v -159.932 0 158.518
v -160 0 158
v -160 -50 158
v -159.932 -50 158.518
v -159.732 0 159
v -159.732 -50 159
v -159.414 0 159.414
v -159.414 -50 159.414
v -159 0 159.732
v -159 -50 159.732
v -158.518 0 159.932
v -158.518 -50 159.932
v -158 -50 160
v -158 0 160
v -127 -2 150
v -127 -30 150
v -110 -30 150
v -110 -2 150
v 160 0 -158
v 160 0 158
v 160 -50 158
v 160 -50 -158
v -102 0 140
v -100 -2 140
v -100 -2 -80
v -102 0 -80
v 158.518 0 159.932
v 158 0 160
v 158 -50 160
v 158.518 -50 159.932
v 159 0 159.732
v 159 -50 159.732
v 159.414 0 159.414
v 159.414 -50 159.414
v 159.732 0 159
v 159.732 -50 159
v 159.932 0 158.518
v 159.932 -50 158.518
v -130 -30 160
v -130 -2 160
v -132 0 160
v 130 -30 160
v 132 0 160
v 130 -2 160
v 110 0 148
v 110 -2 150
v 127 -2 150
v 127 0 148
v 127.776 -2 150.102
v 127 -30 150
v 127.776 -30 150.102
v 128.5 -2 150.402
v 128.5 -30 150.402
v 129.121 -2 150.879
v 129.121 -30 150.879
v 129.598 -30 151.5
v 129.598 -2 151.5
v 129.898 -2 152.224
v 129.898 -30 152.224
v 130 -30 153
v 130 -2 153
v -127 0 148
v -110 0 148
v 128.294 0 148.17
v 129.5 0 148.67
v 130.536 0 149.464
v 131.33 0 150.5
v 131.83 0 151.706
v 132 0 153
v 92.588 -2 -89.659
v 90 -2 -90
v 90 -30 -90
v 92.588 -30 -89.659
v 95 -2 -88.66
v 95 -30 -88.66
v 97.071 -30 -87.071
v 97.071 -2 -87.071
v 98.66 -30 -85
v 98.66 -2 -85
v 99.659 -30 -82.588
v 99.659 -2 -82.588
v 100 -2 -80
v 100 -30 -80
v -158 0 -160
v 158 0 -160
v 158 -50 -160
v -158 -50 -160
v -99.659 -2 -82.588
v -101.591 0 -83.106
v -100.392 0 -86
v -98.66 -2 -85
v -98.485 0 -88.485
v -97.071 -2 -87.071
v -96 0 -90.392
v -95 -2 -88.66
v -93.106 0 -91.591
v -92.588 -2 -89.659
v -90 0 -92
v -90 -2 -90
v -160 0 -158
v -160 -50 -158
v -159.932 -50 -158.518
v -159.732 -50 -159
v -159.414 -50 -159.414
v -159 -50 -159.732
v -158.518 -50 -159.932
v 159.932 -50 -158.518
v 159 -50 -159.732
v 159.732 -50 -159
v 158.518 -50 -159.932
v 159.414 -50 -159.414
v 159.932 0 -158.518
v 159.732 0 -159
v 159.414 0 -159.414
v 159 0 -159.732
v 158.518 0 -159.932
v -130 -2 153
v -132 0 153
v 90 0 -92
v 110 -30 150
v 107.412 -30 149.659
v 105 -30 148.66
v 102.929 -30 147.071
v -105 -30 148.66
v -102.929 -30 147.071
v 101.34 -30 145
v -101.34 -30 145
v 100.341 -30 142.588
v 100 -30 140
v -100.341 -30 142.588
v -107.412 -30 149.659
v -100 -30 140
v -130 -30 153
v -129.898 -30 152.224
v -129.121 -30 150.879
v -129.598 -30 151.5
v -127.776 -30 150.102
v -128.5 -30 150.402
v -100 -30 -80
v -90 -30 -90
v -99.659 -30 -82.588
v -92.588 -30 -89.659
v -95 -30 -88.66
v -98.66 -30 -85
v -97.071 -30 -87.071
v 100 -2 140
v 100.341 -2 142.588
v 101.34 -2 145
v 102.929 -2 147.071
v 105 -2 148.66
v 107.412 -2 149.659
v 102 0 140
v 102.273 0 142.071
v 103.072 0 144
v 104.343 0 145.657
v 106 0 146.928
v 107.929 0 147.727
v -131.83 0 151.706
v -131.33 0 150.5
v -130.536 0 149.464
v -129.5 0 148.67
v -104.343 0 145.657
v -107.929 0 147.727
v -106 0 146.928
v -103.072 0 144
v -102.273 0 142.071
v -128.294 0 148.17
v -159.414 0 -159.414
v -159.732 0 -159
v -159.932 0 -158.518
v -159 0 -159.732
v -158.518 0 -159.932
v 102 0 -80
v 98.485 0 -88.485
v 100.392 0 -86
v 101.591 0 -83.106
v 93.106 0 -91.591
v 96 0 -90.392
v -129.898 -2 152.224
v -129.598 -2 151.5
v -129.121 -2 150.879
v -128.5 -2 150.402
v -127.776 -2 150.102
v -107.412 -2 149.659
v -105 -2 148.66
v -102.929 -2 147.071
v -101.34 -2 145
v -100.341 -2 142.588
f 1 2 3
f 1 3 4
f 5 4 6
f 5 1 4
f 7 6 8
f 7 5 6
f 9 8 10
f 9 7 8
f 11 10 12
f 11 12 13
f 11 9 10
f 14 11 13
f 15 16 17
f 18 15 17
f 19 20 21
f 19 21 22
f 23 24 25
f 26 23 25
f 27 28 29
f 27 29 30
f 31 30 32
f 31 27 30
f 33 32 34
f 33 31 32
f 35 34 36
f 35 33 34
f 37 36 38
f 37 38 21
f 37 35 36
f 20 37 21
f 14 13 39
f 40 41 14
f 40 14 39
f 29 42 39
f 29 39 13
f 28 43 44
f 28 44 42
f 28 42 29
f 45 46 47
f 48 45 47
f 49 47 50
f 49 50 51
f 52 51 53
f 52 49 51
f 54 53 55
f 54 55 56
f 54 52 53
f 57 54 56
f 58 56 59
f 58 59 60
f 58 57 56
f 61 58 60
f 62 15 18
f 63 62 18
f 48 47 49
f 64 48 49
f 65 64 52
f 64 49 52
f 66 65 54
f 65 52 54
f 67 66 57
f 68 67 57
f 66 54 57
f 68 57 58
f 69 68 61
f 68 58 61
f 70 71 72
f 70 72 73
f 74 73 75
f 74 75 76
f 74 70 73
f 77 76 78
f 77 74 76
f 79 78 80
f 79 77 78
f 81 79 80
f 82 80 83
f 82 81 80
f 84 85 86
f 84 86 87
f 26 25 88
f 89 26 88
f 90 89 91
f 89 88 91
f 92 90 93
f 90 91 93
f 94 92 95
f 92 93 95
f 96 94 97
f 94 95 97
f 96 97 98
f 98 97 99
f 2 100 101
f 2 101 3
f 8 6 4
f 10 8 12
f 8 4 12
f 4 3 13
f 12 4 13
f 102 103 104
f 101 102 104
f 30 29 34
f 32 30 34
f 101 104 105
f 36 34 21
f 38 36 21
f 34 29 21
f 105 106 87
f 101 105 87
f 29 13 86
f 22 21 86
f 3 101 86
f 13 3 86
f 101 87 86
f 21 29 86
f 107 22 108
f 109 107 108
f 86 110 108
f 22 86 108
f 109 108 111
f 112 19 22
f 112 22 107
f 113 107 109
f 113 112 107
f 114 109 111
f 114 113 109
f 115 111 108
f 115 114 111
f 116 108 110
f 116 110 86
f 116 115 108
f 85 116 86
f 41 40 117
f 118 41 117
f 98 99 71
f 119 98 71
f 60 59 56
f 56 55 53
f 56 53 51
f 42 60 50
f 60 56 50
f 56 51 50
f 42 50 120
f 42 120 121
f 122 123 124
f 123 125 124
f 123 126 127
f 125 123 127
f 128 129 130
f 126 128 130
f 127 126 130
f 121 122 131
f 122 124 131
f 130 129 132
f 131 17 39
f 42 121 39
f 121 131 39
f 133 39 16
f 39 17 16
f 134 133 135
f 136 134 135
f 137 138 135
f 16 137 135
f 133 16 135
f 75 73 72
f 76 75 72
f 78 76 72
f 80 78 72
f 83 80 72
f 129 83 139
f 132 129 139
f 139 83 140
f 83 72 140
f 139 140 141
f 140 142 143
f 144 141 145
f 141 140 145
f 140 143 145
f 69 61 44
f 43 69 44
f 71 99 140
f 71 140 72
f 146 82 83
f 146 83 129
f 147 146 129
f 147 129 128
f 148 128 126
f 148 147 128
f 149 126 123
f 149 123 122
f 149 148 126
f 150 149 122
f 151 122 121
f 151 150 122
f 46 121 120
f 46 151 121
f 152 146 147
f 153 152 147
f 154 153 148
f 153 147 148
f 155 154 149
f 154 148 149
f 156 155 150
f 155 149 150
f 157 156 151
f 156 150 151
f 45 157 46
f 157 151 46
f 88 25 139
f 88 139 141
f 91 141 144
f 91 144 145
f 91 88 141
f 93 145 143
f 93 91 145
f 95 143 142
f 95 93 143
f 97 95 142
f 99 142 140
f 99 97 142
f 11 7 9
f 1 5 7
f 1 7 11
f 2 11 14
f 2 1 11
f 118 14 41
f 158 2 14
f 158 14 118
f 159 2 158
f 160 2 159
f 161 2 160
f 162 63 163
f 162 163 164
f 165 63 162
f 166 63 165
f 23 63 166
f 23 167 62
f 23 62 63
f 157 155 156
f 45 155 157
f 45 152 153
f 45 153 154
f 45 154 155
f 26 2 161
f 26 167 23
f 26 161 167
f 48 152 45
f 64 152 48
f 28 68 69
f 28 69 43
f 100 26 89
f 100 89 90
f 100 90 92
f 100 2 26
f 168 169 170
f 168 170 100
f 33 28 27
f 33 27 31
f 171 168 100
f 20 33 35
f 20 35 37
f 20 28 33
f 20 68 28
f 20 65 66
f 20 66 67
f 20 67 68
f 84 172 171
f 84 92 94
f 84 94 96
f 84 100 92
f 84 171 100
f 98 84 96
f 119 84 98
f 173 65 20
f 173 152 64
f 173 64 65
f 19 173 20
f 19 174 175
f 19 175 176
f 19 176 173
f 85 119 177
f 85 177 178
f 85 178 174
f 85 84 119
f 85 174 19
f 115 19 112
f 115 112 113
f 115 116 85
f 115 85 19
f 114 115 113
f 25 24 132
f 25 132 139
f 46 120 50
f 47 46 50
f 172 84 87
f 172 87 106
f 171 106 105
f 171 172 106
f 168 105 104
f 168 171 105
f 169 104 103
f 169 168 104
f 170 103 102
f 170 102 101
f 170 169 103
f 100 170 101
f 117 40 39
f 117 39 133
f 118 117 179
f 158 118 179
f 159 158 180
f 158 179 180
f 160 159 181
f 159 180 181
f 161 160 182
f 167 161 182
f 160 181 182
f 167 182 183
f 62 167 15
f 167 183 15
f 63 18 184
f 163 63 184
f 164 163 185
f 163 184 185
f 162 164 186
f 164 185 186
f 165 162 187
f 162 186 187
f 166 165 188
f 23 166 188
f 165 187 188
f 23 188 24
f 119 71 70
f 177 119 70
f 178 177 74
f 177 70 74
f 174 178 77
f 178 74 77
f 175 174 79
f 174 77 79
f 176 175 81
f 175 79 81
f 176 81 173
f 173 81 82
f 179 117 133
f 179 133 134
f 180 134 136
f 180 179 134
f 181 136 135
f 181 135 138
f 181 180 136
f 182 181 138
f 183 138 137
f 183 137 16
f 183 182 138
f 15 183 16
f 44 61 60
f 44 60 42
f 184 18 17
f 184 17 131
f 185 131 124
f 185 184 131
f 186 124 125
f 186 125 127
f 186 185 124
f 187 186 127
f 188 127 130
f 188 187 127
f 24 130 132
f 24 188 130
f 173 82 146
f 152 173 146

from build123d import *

# Parameters (mm, degrees)
EXTRUDE_1_DEPTH     = 50
CUT_EXTRUDE_2_DEPTH = 30
CHAMFER_1_SIZE      = 2


with BuildPart() as part:
    # 草图1 → 凸台-拉伸1 (new body)
    with BuildSketch(Plane(origin=(0, 0, 0), x_dir=(1, 0, 0), z_dir=(0, 1, 0))):
        with BuildLine():
            Line((-158, -160), (158, -160))
            ThreePointArc((158, -160), (159.414213562, -159.414213562), (160, -158))
            Line((160, -158), (160, 158))
            ThreePointArc((160, 158), (159.414213562, 159.414213562), (158, 160))
            Line((158, 160), (-158, 160))
            ThreePointArc((-158, 160), (-159.414213562, 159.414213562), (-160, 158))
            Line((-160, 158), (-160, -158))
            ThreePointArc((-160, -158), (-159.414213562, -159.414213562), (-158, -160))
        make_face()
    extrude(amount=-EXTRUDE_1_DEPTH)

    # 草图2 → 切除-拉伸2 (cut)
    with BuildSketch(Plane(origin=(0, 0, 0), x_dir=(1, 0, 0), z_dir=(0, 1, 0))):
        with BuildLine():
            Line((130, -153), (130, -160))
            Line((130, -160), (-130, -160))
            Line((-130, -160), (-130, -153))
            ThreePointArc((-130, -153), (-129.121320344, -150.878679656), (-127, -150))
            Line((-127, -150), (-110, -150))
            ThreePointArc((-110, -150), (-102.928932188, -147.071067812), (-100, -140))
            Line((-100, -140), (-100, 80))
            ThreePointArc((-100, 80), (-97.071067812, 87.071067812), (-90, 90))
            Line((-90, 90), (90, 90))
            ThreePointArc((90, 90), (97.071067812, 87.071067812), (100, 80))
            Line((100, 80), (100, -140))
            ThreePointArc((100, -140), (102.928932188, -147.071067812), (110, -150))
            Line((110, -150), (127, -150))
            ThreePointArc((127, -150), (129.121320344, -150.878679656), (130, -153))
        make_face()
    extrude(amount=-CUT_EXTRUDE_2_DEPTH, mode=Mode.SUBTRACT)

    # 倒角1
    chamfer_1_edges = [part.edges().sort_by_distance(p)[0] for p in [
        (130, 0, 156.5),
        (129.121320344, 0, 150.878679656),
        (118.5, 0, 150),
        (102.928932188, 0, 147.071067812),
        (100, 0, 30),
        (97.071067812, 0, -87.071067812),
        (0, 0, -90),
        (-97.071067812, 0, -87.071067812),
        (-100, 0, 30),
        (-102.928932188, 0, 147.071067812),
        (-118.5, 0, 150),
        (-129.121320344, 0, 150.878679656),
        (-130, 0, 156.5),
    ]]
    chamfer(chamfer_1_edges, length=CHAMFER_1_SIZE)


solid = part.part
